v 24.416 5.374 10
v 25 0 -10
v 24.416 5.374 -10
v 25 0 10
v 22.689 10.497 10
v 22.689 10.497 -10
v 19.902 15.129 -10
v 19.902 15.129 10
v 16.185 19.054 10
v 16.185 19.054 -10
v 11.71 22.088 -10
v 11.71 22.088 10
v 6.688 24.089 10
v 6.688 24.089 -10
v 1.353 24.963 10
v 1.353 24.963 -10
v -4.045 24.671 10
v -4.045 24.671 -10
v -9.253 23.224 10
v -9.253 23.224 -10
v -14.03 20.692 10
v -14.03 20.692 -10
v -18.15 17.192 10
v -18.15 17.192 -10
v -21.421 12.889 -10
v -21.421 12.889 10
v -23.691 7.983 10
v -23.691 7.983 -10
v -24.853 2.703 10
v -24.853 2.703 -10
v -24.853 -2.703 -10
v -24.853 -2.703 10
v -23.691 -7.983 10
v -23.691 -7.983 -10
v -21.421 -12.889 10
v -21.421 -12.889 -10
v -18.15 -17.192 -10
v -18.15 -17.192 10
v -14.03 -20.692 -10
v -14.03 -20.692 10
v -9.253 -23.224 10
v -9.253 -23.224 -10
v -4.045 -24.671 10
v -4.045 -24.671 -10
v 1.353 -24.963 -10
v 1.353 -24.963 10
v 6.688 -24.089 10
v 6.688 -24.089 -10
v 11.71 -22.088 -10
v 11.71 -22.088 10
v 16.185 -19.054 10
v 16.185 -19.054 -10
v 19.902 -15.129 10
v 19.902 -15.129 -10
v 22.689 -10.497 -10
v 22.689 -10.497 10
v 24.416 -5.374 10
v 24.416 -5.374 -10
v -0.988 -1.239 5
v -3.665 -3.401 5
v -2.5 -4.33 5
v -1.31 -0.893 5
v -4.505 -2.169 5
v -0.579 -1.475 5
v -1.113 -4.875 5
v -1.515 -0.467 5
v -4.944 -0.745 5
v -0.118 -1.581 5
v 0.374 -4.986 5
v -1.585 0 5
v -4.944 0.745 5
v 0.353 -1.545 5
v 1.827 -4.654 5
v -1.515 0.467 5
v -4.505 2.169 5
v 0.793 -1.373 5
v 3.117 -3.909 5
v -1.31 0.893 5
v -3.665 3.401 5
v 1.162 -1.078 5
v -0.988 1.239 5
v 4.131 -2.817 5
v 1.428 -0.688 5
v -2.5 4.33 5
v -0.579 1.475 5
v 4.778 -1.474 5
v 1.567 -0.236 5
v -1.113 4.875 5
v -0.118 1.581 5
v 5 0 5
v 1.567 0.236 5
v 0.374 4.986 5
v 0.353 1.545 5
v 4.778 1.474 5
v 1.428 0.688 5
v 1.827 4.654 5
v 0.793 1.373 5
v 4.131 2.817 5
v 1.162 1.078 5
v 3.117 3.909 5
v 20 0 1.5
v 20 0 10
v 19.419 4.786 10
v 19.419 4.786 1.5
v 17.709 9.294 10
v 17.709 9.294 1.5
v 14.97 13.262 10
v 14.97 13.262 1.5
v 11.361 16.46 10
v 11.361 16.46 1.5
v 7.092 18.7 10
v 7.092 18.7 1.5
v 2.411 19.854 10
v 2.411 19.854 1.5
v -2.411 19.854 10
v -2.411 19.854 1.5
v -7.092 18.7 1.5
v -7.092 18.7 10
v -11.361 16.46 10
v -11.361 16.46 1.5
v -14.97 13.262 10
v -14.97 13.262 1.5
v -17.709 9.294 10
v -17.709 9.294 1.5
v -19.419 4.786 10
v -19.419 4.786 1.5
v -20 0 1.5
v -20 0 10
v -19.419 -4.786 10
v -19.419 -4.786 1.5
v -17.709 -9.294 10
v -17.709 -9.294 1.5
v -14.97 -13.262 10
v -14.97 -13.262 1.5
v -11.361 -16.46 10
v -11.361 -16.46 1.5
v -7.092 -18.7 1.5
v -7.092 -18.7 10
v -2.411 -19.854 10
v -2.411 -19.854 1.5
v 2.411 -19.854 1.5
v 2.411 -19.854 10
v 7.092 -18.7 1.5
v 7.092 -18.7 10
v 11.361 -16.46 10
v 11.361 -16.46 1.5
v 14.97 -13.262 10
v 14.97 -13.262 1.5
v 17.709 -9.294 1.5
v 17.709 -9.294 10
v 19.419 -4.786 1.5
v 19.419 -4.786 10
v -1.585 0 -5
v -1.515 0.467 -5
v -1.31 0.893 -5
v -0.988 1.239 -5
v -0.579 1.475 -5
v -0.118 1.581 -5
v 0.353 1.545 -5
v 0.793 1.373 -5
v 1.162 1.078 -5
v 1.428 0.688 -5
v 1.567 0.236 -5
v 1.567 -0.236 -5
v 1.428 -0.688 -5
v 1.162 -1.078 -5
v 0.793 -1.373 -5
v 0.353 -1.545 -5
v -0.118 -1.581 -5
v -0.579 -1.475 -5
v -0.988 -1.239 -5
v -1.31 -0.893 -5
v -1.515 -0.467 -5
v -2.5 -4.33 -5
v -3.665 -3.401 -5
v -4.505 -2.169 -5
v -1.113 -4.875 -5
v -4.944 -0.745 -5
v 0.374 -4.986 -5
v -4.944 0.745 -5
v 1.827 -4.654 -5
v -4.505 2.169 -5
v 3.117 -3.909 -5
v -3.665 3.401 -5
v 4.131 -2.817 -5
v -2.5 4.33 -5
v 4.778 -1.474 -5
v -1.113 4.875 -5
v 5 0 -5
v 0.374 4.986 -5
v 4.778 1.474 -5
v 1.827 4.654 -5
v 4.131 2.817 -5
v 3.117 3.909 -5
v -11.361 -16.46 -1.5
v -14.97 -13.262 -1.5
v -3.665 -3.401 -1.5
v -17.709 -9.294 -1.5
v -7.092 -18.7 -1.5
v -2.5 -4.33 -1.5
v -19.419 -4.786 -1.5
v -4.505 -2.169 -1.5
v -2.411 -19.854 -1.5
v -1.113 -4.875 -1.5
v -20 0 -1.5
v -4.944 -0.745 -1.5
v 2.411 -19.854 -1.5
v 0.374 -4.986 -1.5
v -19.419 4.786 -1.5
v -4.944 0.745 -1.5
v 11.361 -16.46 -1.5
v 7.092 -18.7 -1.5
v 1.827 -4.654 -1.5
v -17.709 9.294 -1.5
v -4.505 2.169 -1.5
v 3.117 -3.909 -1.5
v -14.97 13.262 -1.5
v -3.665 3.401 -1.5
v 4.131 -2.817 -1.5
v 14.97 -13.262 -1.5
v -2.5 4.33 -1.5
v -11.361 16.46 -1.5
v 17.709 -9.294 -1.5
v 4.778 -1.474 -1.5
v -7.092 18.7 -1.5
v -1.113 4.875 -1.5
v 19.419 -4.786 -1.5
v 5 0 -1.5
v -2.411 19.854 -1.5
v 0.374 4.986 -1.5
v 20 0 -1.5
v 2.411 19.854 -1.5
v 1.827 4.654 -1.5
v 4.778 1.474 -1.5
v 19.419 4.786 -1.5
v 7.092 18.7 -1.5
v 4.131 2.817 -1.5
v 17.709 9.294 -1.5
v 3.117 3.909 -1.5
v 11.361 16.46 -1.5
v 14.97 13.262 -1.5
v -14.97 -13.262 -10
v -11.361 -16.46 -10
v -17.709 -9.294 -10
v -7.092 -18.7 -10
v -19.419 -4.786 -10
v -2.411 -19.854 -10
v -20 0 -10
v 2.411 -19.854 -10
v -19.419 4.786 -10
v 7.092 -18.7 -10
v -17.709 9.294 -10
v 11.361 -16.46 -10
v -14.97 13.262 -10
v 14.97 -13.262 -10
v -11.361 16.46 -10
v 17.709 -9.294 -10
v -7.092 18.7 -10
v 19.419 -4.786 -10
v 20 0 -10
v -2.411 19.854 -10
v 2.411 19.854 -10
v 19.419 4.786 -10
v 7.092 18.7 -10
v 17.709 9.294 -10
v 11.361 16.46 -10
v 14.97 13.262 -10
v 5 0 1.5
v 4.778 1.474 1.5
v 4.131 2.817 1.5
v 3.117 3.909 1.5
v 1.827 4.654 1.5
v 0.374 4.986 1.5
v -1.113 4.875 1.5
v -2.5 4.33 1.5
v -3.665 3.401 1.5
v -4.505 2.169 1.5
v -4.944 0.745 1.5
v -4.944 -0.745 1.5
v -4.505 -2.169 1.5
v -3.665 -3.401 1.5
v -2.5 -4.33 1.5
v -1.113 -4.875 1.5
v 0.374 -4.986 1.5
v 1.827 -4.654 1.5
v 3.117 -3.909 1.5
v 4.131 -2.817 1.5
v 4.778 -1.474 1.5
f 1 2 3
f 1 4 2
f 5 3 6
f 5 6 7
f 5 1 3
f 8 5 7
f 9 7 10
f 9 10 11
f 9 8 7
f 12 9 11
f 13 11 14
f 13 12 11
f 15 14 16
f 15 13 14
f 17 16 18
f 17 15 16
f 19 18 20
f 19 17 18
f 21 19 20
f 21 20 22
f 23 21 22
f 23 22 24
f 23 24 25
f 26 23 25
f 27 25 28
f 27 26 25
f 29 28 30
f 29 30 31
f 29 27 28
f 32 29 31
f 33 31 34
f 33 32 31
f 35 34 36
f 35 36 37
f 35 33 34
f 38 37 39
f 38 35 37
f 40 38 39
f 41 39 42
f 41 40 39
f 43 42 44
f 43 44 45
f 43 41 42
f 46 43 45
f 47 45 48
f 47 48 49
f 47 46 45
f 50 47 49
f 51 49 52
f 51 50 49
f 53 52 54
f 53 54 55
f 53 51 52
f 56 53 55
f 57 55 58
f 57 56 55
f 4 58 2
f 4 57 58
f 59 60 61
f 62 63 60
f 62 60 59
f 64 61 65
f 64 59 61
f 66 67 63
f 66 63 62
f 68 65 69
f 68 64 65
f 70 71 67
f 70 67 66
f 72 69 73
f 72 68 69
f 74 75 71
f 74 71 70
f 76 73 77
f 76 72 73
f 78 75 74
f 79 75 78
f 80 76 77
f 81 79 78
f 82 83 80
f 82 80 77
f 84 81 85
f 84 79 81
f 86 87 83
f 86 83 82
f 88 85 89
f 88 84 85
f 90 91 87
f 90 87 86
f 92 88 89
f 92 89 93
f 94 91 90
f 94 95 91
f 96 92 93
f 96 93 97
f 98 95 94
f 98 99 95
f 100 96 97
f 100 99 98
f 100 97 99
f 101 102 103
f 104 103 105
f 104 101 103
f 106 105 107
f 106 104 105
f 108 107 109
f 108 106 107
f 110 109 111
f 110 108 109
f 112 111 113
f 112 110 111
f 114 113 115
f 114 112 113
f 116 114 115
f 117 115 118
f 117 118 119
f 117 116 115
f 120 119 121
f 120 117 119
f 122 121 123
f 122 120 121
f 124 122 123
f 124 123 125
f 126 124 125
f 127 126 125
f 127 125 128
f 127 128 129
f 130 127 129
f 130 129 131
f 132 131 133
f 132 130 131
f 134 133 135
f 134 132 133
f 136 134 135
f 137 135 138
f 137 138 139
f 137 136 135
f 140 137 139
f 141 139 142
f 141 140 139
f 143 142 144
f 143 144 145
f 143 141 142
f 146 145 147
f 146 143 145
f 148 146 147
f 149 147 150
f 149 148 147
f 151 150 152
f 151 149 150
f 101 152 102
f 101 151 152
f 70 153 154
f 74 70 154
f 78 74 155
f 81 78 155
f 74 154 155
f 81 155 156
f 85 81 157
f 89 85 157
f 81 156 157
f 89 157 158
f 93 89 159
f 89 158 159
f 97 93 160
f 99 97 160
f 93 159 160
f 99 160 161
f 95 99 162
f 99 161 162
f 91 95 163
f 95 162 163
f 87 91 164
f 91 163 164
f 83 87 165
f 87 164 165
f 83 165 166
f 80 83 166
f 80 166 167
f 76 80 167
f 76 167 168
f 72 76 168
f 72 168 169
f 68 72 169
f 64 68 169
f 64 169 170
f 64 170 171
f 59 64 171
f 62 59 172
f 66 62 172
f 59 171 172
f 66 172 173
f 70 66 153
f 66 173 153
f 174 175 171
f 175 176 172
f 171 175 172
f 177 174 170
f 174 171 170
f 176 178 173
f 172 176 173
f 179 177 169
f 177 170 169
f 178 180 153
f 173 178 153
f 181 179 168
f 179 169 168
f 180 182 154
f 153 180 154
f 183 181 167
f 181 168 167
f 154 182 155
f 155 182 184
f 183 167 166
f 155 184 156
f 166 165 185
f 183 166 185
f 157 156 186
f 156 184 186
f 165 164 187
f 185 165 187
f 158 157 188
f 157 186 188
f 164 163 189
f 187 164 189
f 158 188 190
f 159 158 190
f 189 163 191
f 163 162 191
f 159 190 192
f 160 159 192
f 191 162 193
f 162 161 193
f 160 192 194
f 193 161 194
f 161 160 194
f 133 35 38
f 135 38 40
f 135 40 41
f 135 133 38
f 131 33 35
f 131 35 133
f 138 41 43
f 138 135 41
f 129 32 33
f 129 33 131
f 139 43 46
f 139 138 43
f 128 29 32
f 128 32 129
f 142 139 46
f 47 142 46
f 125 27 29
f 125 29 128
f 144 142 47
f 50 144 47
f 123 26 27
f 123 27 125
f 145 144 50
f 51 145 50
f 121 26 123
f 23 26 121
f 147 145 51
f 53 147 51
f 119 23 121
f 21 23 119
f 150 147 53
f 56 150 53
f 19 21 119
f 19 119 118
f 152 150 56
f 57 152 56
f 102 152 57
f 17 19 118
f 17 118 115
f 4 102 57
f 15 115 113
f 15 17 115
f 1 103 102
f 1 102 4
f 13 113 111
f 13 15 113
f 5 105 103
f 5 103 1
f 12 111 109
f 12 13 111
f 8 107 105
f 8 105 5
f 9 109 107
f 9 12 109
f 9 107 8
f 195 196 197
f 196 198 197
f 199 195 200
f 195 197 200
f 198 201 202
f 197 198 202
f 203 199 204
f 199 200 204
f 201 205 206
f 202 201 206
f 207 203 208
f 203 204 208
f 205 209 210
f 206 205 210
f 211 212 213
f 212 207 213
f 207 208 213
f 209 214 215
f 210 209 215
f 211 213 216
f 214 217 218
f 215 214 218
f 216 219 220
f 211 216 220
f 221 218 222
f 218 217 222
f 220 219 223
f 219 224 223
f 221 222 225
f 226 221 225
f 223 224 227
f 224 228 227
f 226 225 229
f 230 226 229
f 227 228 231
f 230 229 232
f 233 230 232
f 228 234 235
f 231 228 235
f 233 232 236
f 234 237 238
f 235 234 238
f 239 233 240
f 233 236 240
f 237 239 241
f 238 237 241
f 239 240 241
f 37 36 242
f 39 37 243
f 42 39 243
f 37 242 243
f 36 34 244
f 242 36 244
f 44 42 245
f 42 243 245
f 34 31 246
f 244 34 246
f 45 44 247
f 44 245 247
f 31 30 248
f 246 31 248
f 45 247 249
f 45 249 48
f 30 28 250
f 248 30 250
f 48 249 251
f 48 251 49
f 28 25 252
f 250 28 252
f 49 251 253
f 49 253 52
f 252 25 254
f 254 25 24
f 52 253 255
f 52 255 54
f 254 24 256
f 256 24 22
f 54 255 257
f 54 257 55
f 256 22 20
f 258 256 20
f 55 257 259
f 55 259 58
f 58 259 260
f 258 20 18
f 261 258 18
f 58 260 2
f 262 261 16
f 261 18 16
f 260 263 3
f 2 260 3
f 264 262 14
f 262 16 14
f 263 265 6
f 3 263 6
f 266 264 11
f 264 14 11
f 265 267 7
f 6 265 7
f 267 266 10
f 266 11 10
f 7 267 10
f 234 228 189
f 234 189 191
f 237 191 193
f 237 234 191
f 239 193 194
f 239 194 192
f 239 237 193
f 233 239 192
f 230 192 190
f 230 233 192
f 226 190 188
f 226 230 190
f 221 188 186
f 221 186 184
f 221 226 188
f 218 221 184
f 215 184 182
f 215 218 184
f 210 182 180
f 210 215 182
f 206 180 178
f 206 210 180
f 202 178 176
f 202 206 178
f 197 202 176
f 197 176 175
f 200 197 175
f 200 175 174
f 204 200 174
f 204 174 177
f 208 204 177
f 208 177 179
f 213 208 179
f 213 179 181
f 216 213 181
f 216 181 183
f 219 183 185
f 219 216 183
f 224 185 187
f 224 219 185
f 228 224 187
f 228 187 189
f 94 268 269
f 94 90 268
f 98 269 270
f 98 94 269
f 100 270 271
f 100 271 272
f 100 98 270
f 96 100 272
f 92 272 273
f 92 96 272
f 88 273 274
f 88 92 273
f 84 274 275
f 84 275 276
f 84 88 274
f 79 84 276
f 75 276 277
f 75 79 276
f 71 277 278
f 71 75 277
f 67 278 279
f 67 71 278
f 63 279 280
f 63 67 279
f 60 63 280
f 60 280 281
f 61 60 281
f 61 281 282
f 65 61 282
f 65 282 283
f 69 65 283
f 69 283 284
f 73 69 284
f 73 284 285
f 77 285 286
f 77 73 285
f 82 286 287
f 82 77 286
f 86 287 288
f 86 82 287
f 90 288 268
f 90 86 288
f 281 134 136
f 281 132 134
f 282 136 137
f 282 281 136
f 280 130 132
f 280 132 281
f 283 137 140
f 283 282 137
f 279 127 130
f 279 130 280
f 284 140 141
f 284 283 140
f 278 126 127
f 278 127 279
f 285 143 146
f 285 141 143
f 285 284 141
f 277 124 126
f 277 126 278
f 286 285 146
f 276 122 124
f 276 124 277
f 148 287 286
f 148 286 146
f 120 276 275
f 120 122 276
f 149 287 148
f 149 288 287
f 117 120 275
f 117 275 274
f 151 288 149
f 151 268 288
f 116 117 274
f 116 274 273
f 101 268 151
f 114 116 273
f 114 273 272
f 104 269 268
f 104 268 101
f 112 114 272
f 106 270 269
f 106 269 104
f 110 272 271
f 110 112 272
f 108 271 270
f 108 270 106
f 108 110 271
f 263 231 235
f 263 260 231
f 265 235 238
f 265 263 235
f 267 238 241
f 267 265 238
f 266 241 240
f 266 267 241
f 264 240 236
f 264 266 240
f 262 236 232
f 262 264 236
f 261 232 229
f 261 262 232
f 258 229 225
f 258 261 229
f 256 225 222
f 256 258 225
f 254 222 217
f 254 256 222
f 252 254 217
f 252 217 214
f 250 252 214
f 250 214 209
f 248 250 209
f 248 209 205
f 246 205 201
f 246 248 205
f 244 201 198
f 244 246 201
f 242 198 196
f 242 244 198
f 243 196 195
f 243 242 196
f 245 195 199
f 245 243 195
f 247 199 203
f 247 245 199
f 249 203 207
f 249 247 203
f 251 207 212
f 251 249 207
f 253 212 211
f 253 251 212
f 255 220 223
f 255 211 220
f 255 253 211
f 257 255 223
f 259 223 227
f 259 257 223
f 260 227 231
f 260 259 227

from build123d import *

# Parameters (mm, degrees)
SKETCH1_R           = 25
BOSS_EXTRUDE1_DEPTH = 1.5
SKETCH2_R           = 25
SKETCH2_R_2         = 20
BOSS_EXTRUDE2_DEPTH = 10
SKETCH3_R           = 5
BOSS_EXTRUDE3_DEPTH = 5
SKETCH4_R           = 1.585
CUT_EXTRUDE1_DEPTH  = 10


with BuildPart() as part:
    # Sketch1 → Boss-Extrude1 (new, symmetric)
    with BuildSketch(Plane.XY):
        Circle(SKETCH1_R)
    extrude(amount=BOSS_EXTRUDE1_DEPTH, both=True)

    # Sketch2 → Boss-Extrude2 (add, symmetric)
    with BuildSketch(Plane.XY):
        Circle(SKETCH2_R)
        Circle(SKETCH2_R_2, mode=Mode.SUBTRACT)
    extrude(amount=BOSS_EXTRUDE2_DEPTH, both=True)

    # Sketch3 → Boss-Extrude3 (add, symmetric)
    with BuildSketch(Plane.XY):
        Circle(SKETCH3_R)
    extrude(amount=BOSS_EXTRUDE3_DEPTH, both=True)

    # Sketch4 → Cut-Extrude1 (cut)
    with BuildSketch(Plane(origin=(0, 0, -5), x_dir=(-1, 0, 0), z_dir=(0, 0, -1))):
        Circle(SKETCH4_R)
    extrude(amount=-CUT_EXTRUDE1_DEPTH, mode=Mode.SUBTRACT)


solid = part.part
